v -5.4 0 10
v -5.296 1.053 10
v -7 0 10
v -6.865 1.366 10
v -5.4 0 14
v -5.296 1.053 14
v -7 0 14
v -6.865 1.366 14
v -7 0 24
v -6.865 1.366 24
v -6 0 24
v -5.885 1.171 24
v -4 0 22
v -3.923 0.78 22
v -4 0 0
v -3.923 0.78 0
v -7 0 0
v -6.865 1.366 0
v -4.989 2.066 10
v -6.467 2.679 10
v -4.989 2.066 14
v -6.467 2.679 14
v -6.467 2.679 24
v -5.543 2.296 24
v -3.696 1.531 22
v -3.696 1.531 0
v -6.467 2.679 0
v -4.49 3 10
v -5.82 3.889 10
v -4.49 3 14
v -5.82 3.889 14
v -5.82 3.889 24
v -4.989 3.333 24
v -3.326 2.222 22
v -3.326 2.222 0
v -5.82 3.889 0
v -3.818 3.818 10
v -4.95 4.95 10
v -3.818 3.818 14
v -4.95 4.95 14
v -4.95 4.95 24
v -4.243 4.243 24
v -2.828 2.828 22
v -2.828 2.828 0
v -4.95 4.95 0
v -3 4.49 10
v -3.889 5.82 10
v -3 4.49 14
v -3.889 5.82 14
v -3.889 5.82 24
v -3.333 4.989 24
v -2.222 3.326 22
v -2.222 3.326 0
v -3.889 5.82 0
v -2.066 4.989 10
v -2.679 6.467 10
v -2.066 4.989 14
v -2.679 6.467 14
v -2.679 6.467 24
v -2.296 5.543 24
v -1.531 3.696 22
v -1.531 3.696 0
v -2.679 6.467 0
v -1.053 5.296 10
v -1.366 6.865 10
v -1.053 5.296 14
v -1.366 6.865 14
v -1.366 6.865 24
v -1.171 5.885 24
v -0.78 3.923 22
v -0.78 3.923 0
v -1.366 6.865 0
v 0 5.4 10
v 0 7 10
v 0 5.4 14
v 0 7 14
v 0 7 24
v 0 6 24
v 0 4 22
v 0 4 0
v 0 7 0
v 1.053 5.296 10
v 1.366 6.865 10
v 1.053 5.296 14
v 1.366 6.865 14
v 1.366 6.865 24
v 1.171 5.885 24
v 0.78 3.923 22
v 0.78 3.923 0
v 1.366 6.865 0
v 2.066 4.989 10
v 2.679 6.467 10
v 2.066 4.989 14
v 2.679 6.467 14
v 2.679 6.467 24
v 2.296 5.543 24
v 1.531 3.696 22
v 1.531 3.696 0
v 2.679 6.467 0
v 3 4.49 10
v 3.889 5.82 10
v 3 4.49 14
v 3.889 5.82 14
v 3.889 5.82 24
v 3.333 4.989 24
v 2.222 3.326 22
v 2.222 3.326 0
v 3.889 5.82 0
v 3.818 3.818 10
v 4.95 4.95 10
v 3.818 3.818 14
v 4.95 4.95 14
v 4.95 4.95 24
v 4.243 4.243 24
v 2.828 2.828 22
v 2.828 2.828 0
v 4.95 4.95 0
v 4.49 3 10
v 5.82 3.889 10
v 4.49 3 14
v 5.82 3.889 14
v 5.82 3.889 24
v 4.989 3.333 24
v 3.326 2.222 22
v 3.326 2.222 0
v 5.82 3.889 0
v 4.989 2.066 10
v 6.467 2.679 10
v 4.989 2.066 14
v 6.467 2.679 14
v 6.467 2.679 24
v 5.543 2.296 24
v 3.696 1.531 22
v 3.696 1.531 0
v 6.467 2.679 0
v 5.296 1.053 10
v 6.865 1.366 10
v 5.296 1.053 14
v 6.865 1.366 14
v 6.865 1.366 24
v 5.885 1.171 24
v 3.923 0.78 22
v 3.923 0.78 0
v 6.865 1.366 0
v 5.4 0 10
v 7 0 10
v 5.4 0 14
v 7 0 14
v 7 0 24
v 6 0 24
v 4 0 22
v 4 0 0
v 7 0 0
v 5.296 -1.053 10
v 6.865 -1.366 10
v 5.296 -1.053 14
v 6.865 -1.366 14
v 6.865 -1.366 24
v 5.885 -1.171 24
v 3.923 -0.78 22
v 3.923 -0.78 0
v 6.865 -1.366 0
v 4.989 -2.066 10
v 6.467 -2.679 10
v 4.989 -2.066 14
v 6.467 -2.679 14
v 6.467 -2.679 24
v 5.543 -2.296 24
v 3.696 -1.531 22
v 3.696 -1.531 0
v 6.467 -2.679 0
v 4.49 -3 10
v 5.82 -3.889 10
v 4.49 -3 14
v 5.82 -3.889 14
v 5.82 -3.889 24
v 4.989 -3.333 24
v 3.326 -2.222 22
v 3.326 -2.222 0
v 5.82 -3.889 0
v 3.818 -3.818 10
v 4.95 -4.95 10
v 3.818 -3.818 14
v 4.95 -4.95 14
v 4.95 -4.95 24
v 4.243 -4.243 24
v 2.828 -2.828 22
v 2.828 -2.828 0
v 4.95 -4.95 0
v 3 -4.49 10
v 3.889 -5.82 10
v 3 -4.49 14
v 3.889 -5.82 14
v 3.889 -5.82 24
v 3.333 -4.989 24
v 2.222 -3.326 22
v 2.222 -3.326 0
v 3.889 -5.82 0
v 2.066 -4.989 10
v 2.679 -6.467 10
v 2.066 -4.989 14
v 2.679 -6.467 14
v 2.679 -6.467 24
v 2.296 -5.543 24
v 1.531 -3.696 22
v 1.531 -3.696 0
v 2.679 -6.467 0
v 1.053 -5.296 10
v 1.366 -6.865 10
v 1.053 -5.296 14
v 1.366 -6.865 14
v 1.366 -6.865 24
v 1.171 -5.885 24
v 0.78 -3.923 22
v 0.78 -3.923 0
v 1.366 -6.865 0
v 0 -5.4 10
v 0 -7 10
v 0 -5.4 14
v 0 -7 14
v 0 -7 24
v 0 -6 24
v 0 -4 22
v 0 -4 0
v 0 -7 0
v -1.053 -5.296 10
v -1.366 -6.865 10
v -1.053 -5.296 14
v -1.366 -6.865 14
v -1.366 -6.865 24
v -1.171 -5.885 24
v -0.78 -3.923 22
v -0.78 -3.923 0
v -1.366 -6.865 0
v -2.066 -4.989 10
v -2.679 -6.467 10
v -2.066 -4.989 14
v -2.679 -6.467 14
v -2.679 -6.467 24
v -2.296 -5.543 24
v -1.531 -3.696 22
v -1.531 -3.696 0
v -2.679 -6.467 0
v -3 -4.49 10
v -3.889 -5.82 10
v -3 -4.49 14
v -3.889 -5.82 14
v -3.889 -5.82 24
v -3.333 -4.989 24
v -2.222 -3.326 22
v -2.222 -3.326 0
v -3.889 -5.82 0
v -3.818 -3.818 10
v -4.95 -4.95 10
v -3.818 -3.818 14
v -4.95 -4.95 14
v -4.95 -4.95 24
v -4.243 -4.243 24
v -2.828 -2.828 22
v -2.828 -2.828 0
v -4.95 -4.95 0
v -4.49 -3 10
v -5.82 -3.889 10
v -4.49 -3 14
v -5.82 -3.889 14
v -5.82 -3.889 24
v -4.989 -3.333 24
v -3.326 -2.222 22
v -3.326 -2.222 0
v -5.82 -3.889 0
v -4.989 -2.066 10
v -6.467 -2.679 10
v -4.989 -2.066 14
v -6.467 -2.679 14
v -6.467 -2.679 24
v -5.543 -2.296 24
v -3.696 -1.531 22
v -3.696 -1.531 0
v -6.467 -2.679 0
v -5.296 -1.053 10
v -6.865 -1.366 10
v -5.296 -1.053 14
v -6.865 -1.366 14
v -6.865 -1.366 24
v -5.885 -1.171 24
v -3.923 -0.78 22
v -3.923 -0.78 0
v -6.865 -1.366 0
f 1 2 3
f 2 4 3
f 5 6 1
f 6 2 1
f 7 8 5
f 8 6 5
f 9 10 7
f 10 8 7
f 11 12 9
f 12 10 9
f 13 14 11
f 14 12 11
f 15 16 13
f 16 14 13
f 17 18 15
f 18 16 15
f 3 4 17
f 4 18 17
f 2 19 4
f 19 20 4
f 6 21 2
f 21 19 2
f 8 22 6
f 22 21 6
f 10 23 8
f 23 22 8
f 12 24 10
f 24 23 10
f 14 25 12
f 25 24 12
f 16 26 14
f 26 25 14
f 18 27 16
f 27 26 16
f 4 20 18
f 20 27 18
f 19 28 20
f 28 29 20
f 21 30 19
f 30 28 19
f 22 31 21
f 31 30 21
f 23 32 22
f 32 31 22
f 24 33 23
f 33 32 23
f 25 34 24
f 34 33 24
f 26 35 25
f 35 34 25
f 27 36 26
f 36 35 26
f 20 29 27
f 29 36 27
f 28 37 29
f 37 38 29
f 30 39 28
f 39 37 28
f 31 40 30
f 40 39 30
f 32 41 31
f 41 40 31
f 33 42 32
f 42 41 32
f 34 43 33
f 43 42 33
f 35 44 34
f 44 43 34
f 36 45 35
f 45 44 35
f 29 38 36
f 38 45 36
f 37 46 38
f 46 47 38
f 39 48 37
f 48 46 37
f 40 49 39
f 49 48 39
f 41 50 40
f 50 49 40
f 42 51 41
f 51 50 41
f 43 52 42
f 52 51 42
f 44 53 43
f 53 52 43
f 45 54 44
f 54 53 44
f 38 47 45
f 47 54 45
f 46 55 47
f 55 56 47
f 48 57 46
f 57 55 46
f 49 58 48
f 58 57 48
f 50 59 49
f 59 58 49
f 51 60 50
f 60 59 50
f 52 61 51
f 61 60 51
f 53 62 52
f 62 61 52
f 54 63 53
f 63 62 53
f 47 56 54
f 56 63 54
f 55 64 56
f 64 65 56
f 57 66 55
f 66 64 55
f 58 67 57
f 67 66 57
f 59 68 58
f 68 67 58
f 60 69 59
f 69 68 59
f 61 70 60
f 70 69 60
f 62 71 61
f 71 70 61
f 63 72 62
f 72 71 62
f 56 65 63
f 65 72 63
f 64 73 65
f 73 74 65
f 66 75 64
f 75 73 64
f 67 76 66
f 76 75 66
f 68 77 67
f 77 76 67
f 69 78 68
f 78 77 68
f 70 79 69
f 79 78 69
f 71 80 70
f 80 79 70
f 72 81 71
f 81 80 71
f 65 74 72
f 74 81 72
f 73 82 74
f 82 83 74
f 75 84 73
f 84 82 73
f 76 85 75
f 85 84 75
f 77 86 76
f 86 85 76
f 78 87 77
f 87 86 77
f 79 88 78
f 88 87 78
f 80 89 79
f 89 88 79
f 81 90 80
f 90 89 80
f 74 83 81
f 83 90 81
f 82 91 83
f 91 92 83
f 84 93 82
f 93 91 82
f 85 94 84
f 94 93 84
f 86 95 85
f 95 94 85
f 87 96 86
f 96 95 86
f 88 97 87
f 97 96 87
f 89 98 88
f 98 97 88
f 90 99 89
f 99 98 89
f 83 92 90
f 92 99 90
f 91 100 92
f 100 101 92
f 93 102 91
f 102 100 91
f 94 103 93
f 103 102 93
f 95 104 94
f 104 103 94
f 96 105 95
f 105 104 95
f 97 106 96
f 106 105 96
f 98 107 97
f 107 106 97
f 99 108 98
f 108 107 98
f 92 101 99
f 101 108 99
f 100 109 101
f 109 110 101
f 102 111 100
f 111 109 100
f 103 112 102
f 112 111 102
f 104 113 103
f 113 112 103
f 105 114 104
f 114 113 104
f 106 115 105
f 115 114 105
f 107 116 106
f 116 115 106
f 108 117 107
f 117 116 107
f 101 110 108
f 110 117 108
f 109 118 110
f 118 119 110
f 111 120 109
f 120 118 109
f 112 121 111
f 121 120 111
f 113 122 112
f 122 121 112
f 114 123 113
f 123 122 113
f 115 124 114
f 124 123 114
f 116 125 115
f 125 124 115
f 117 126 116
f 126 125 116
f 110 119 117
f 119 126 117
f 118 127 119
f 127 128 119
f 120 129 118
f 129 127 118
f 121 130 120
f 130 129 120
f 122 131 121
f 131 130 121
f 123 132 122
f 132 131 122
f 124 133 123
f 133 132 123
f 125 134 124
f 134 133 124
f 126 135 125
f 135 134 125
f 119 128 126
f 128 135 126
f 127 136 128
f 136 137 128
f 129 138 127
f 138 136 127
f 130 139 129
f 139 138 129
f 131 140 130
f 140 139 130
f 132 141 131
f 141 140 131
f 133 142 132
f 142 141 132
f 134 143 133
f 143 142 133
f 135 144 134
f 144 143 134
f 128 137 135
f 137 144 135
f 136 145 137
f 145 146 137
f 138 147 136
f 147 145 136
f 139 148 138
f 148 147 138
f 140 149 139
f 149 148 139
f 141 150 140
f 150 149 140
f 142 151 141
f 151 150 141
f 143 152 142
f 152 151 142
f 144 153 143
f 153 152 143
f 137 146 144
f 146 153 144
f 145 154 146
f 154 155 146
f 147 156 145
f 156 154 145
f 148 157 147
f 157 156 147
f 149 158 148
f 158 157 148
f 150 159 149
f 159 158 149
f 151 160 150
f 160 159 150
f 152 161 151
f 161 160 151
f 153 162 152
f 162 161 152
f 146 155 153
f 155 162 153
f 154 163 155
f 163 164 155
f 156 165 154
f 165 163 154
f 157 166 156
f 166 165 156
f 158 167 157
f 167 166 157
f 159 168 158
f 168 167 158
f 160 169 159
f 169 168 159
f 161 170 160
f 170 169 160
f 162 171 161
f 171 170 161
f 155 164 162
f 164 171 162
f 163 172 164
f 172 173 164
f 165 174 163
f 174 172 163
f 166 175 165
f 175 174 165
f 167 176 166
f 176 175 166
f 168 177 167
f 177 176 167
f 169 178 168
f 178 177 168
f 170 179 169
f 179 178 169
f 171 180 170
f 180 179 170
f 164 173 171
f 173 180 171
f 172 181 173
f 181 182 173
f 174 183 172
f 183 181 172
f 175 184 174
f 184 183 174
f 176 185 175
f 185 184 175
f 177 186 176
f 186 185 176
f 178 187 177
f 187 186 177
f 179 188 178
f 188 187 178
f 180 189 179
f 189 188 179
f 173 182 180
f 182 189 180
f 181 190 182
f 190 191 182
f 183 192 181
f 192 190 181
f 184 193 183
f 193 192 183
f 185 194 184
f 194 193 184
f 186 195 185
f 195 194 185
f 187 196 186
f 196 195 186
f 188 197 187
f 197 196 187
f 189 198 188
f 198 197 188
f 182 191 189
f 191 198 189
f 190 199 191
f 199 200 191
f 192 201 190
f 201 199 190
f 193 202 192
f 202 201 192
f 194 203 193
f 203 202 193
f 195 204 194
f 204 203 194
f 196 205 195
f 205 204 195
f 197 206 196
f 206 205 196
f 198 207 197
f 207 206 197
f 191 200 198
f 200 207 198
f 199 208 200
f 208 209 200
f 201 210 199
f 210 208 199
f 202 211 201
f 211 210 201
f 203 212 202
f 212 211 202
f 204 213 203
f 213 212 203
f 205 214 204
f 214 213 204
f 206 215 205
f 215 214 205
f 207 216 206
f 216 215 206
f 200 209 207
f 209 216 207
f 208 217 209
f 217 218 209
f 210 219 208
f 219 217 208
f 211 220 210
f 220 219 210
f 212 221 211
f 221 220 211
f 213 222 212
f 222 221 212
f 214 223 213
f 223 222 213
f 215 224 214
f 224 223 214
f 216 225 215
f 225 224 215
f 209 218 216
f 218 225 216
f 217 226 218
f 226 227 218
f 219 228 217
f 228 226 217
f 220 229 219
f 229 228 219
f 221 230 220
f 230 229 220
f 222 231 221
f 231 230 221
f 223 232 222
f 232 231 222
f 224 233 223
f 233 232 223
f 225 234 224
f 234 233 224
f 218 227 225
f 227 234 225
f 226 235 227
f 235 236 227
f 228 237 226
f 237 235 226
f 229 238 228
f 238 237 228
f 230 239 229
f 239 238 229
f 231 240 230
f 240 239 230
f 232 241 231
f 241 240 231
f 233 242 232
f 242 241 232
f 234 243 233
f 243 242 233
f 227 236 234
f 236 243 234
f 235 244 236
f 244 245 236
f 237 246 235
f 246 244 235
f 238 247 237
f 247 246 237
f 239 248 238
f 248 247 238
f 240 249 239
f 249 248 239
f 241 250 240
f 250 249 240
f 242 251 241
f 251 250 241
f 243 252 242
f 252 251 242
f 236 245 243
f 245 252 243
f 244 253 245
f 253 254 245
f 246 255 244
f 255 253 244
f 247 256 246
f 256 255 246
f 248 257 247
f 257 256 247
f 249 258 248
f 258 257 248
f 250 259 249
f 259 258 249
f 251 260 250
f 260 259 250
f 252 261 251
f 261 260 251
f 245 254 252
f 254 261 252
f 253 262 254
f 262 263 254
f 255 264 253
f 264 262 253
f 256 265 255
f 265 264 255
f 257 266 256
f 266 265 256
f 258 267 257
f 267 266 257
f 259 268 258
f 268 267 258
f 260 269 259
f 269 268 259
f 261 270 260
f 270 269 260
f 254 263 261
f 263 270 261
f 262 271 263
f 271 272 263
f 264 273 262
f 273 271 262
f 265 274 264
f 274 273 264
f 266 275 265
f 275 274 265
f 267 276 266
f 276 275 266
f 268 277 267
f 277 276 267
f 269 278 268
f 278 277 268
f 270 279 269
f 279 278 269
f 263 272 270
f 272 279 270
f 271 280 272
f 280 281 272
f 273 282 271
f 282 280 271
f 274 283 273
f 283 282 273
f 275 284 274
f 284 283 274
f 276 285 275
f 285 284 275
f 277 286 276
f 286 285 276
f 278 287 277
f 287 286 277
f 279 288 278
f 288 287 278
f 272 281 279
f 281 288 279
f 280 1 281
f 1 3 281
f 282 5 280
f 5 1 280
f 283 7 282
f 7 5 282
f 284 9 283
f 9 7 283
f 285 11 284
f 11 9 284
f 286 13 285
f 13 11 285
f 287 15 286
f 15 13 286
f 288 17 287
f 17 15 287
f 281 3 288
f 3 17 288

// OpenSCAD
$fn = 32;

// ----------------------------------------------------------------------
// Grooved revolve: thread_relief, bore R4
// ----------------------------------------------------------------------

// --- parameters (mm) ---
bore_r = 4;               // bore radius
outer_r = 7;              // outer radius of the body
total_h = 24;             // overall height, Z
wall = 3;                 // radial wall thickness
groove_w = 4;             // groove width
groove_d = 1.6;           // groove depth
grooves = 1;              // number of outer grooves
relief = 2;               // thread relief leg at the bore mouth
relief_angle = 45;        // thread relief chamfer angle, degrees

bbox_x = 2 * outer_r;  // full diameter
bore_d = 2 * bore_r;  // bore diameter
body_d = 2 * outer_r;  // body diameter
revolve_angle = 360;  // full turn around the Z axis

profile = [[4, 0], [7, 0], [7, 10], [5.4, 10], [5.4, 14], [7, 14], [7, 24], [6, 24], [4, 22]];  // primary outline, 9 points, counter clockwise

// --- the one profile operation ---
rotate_extrude(angle = revolve_angle) polygon(points = profile);
